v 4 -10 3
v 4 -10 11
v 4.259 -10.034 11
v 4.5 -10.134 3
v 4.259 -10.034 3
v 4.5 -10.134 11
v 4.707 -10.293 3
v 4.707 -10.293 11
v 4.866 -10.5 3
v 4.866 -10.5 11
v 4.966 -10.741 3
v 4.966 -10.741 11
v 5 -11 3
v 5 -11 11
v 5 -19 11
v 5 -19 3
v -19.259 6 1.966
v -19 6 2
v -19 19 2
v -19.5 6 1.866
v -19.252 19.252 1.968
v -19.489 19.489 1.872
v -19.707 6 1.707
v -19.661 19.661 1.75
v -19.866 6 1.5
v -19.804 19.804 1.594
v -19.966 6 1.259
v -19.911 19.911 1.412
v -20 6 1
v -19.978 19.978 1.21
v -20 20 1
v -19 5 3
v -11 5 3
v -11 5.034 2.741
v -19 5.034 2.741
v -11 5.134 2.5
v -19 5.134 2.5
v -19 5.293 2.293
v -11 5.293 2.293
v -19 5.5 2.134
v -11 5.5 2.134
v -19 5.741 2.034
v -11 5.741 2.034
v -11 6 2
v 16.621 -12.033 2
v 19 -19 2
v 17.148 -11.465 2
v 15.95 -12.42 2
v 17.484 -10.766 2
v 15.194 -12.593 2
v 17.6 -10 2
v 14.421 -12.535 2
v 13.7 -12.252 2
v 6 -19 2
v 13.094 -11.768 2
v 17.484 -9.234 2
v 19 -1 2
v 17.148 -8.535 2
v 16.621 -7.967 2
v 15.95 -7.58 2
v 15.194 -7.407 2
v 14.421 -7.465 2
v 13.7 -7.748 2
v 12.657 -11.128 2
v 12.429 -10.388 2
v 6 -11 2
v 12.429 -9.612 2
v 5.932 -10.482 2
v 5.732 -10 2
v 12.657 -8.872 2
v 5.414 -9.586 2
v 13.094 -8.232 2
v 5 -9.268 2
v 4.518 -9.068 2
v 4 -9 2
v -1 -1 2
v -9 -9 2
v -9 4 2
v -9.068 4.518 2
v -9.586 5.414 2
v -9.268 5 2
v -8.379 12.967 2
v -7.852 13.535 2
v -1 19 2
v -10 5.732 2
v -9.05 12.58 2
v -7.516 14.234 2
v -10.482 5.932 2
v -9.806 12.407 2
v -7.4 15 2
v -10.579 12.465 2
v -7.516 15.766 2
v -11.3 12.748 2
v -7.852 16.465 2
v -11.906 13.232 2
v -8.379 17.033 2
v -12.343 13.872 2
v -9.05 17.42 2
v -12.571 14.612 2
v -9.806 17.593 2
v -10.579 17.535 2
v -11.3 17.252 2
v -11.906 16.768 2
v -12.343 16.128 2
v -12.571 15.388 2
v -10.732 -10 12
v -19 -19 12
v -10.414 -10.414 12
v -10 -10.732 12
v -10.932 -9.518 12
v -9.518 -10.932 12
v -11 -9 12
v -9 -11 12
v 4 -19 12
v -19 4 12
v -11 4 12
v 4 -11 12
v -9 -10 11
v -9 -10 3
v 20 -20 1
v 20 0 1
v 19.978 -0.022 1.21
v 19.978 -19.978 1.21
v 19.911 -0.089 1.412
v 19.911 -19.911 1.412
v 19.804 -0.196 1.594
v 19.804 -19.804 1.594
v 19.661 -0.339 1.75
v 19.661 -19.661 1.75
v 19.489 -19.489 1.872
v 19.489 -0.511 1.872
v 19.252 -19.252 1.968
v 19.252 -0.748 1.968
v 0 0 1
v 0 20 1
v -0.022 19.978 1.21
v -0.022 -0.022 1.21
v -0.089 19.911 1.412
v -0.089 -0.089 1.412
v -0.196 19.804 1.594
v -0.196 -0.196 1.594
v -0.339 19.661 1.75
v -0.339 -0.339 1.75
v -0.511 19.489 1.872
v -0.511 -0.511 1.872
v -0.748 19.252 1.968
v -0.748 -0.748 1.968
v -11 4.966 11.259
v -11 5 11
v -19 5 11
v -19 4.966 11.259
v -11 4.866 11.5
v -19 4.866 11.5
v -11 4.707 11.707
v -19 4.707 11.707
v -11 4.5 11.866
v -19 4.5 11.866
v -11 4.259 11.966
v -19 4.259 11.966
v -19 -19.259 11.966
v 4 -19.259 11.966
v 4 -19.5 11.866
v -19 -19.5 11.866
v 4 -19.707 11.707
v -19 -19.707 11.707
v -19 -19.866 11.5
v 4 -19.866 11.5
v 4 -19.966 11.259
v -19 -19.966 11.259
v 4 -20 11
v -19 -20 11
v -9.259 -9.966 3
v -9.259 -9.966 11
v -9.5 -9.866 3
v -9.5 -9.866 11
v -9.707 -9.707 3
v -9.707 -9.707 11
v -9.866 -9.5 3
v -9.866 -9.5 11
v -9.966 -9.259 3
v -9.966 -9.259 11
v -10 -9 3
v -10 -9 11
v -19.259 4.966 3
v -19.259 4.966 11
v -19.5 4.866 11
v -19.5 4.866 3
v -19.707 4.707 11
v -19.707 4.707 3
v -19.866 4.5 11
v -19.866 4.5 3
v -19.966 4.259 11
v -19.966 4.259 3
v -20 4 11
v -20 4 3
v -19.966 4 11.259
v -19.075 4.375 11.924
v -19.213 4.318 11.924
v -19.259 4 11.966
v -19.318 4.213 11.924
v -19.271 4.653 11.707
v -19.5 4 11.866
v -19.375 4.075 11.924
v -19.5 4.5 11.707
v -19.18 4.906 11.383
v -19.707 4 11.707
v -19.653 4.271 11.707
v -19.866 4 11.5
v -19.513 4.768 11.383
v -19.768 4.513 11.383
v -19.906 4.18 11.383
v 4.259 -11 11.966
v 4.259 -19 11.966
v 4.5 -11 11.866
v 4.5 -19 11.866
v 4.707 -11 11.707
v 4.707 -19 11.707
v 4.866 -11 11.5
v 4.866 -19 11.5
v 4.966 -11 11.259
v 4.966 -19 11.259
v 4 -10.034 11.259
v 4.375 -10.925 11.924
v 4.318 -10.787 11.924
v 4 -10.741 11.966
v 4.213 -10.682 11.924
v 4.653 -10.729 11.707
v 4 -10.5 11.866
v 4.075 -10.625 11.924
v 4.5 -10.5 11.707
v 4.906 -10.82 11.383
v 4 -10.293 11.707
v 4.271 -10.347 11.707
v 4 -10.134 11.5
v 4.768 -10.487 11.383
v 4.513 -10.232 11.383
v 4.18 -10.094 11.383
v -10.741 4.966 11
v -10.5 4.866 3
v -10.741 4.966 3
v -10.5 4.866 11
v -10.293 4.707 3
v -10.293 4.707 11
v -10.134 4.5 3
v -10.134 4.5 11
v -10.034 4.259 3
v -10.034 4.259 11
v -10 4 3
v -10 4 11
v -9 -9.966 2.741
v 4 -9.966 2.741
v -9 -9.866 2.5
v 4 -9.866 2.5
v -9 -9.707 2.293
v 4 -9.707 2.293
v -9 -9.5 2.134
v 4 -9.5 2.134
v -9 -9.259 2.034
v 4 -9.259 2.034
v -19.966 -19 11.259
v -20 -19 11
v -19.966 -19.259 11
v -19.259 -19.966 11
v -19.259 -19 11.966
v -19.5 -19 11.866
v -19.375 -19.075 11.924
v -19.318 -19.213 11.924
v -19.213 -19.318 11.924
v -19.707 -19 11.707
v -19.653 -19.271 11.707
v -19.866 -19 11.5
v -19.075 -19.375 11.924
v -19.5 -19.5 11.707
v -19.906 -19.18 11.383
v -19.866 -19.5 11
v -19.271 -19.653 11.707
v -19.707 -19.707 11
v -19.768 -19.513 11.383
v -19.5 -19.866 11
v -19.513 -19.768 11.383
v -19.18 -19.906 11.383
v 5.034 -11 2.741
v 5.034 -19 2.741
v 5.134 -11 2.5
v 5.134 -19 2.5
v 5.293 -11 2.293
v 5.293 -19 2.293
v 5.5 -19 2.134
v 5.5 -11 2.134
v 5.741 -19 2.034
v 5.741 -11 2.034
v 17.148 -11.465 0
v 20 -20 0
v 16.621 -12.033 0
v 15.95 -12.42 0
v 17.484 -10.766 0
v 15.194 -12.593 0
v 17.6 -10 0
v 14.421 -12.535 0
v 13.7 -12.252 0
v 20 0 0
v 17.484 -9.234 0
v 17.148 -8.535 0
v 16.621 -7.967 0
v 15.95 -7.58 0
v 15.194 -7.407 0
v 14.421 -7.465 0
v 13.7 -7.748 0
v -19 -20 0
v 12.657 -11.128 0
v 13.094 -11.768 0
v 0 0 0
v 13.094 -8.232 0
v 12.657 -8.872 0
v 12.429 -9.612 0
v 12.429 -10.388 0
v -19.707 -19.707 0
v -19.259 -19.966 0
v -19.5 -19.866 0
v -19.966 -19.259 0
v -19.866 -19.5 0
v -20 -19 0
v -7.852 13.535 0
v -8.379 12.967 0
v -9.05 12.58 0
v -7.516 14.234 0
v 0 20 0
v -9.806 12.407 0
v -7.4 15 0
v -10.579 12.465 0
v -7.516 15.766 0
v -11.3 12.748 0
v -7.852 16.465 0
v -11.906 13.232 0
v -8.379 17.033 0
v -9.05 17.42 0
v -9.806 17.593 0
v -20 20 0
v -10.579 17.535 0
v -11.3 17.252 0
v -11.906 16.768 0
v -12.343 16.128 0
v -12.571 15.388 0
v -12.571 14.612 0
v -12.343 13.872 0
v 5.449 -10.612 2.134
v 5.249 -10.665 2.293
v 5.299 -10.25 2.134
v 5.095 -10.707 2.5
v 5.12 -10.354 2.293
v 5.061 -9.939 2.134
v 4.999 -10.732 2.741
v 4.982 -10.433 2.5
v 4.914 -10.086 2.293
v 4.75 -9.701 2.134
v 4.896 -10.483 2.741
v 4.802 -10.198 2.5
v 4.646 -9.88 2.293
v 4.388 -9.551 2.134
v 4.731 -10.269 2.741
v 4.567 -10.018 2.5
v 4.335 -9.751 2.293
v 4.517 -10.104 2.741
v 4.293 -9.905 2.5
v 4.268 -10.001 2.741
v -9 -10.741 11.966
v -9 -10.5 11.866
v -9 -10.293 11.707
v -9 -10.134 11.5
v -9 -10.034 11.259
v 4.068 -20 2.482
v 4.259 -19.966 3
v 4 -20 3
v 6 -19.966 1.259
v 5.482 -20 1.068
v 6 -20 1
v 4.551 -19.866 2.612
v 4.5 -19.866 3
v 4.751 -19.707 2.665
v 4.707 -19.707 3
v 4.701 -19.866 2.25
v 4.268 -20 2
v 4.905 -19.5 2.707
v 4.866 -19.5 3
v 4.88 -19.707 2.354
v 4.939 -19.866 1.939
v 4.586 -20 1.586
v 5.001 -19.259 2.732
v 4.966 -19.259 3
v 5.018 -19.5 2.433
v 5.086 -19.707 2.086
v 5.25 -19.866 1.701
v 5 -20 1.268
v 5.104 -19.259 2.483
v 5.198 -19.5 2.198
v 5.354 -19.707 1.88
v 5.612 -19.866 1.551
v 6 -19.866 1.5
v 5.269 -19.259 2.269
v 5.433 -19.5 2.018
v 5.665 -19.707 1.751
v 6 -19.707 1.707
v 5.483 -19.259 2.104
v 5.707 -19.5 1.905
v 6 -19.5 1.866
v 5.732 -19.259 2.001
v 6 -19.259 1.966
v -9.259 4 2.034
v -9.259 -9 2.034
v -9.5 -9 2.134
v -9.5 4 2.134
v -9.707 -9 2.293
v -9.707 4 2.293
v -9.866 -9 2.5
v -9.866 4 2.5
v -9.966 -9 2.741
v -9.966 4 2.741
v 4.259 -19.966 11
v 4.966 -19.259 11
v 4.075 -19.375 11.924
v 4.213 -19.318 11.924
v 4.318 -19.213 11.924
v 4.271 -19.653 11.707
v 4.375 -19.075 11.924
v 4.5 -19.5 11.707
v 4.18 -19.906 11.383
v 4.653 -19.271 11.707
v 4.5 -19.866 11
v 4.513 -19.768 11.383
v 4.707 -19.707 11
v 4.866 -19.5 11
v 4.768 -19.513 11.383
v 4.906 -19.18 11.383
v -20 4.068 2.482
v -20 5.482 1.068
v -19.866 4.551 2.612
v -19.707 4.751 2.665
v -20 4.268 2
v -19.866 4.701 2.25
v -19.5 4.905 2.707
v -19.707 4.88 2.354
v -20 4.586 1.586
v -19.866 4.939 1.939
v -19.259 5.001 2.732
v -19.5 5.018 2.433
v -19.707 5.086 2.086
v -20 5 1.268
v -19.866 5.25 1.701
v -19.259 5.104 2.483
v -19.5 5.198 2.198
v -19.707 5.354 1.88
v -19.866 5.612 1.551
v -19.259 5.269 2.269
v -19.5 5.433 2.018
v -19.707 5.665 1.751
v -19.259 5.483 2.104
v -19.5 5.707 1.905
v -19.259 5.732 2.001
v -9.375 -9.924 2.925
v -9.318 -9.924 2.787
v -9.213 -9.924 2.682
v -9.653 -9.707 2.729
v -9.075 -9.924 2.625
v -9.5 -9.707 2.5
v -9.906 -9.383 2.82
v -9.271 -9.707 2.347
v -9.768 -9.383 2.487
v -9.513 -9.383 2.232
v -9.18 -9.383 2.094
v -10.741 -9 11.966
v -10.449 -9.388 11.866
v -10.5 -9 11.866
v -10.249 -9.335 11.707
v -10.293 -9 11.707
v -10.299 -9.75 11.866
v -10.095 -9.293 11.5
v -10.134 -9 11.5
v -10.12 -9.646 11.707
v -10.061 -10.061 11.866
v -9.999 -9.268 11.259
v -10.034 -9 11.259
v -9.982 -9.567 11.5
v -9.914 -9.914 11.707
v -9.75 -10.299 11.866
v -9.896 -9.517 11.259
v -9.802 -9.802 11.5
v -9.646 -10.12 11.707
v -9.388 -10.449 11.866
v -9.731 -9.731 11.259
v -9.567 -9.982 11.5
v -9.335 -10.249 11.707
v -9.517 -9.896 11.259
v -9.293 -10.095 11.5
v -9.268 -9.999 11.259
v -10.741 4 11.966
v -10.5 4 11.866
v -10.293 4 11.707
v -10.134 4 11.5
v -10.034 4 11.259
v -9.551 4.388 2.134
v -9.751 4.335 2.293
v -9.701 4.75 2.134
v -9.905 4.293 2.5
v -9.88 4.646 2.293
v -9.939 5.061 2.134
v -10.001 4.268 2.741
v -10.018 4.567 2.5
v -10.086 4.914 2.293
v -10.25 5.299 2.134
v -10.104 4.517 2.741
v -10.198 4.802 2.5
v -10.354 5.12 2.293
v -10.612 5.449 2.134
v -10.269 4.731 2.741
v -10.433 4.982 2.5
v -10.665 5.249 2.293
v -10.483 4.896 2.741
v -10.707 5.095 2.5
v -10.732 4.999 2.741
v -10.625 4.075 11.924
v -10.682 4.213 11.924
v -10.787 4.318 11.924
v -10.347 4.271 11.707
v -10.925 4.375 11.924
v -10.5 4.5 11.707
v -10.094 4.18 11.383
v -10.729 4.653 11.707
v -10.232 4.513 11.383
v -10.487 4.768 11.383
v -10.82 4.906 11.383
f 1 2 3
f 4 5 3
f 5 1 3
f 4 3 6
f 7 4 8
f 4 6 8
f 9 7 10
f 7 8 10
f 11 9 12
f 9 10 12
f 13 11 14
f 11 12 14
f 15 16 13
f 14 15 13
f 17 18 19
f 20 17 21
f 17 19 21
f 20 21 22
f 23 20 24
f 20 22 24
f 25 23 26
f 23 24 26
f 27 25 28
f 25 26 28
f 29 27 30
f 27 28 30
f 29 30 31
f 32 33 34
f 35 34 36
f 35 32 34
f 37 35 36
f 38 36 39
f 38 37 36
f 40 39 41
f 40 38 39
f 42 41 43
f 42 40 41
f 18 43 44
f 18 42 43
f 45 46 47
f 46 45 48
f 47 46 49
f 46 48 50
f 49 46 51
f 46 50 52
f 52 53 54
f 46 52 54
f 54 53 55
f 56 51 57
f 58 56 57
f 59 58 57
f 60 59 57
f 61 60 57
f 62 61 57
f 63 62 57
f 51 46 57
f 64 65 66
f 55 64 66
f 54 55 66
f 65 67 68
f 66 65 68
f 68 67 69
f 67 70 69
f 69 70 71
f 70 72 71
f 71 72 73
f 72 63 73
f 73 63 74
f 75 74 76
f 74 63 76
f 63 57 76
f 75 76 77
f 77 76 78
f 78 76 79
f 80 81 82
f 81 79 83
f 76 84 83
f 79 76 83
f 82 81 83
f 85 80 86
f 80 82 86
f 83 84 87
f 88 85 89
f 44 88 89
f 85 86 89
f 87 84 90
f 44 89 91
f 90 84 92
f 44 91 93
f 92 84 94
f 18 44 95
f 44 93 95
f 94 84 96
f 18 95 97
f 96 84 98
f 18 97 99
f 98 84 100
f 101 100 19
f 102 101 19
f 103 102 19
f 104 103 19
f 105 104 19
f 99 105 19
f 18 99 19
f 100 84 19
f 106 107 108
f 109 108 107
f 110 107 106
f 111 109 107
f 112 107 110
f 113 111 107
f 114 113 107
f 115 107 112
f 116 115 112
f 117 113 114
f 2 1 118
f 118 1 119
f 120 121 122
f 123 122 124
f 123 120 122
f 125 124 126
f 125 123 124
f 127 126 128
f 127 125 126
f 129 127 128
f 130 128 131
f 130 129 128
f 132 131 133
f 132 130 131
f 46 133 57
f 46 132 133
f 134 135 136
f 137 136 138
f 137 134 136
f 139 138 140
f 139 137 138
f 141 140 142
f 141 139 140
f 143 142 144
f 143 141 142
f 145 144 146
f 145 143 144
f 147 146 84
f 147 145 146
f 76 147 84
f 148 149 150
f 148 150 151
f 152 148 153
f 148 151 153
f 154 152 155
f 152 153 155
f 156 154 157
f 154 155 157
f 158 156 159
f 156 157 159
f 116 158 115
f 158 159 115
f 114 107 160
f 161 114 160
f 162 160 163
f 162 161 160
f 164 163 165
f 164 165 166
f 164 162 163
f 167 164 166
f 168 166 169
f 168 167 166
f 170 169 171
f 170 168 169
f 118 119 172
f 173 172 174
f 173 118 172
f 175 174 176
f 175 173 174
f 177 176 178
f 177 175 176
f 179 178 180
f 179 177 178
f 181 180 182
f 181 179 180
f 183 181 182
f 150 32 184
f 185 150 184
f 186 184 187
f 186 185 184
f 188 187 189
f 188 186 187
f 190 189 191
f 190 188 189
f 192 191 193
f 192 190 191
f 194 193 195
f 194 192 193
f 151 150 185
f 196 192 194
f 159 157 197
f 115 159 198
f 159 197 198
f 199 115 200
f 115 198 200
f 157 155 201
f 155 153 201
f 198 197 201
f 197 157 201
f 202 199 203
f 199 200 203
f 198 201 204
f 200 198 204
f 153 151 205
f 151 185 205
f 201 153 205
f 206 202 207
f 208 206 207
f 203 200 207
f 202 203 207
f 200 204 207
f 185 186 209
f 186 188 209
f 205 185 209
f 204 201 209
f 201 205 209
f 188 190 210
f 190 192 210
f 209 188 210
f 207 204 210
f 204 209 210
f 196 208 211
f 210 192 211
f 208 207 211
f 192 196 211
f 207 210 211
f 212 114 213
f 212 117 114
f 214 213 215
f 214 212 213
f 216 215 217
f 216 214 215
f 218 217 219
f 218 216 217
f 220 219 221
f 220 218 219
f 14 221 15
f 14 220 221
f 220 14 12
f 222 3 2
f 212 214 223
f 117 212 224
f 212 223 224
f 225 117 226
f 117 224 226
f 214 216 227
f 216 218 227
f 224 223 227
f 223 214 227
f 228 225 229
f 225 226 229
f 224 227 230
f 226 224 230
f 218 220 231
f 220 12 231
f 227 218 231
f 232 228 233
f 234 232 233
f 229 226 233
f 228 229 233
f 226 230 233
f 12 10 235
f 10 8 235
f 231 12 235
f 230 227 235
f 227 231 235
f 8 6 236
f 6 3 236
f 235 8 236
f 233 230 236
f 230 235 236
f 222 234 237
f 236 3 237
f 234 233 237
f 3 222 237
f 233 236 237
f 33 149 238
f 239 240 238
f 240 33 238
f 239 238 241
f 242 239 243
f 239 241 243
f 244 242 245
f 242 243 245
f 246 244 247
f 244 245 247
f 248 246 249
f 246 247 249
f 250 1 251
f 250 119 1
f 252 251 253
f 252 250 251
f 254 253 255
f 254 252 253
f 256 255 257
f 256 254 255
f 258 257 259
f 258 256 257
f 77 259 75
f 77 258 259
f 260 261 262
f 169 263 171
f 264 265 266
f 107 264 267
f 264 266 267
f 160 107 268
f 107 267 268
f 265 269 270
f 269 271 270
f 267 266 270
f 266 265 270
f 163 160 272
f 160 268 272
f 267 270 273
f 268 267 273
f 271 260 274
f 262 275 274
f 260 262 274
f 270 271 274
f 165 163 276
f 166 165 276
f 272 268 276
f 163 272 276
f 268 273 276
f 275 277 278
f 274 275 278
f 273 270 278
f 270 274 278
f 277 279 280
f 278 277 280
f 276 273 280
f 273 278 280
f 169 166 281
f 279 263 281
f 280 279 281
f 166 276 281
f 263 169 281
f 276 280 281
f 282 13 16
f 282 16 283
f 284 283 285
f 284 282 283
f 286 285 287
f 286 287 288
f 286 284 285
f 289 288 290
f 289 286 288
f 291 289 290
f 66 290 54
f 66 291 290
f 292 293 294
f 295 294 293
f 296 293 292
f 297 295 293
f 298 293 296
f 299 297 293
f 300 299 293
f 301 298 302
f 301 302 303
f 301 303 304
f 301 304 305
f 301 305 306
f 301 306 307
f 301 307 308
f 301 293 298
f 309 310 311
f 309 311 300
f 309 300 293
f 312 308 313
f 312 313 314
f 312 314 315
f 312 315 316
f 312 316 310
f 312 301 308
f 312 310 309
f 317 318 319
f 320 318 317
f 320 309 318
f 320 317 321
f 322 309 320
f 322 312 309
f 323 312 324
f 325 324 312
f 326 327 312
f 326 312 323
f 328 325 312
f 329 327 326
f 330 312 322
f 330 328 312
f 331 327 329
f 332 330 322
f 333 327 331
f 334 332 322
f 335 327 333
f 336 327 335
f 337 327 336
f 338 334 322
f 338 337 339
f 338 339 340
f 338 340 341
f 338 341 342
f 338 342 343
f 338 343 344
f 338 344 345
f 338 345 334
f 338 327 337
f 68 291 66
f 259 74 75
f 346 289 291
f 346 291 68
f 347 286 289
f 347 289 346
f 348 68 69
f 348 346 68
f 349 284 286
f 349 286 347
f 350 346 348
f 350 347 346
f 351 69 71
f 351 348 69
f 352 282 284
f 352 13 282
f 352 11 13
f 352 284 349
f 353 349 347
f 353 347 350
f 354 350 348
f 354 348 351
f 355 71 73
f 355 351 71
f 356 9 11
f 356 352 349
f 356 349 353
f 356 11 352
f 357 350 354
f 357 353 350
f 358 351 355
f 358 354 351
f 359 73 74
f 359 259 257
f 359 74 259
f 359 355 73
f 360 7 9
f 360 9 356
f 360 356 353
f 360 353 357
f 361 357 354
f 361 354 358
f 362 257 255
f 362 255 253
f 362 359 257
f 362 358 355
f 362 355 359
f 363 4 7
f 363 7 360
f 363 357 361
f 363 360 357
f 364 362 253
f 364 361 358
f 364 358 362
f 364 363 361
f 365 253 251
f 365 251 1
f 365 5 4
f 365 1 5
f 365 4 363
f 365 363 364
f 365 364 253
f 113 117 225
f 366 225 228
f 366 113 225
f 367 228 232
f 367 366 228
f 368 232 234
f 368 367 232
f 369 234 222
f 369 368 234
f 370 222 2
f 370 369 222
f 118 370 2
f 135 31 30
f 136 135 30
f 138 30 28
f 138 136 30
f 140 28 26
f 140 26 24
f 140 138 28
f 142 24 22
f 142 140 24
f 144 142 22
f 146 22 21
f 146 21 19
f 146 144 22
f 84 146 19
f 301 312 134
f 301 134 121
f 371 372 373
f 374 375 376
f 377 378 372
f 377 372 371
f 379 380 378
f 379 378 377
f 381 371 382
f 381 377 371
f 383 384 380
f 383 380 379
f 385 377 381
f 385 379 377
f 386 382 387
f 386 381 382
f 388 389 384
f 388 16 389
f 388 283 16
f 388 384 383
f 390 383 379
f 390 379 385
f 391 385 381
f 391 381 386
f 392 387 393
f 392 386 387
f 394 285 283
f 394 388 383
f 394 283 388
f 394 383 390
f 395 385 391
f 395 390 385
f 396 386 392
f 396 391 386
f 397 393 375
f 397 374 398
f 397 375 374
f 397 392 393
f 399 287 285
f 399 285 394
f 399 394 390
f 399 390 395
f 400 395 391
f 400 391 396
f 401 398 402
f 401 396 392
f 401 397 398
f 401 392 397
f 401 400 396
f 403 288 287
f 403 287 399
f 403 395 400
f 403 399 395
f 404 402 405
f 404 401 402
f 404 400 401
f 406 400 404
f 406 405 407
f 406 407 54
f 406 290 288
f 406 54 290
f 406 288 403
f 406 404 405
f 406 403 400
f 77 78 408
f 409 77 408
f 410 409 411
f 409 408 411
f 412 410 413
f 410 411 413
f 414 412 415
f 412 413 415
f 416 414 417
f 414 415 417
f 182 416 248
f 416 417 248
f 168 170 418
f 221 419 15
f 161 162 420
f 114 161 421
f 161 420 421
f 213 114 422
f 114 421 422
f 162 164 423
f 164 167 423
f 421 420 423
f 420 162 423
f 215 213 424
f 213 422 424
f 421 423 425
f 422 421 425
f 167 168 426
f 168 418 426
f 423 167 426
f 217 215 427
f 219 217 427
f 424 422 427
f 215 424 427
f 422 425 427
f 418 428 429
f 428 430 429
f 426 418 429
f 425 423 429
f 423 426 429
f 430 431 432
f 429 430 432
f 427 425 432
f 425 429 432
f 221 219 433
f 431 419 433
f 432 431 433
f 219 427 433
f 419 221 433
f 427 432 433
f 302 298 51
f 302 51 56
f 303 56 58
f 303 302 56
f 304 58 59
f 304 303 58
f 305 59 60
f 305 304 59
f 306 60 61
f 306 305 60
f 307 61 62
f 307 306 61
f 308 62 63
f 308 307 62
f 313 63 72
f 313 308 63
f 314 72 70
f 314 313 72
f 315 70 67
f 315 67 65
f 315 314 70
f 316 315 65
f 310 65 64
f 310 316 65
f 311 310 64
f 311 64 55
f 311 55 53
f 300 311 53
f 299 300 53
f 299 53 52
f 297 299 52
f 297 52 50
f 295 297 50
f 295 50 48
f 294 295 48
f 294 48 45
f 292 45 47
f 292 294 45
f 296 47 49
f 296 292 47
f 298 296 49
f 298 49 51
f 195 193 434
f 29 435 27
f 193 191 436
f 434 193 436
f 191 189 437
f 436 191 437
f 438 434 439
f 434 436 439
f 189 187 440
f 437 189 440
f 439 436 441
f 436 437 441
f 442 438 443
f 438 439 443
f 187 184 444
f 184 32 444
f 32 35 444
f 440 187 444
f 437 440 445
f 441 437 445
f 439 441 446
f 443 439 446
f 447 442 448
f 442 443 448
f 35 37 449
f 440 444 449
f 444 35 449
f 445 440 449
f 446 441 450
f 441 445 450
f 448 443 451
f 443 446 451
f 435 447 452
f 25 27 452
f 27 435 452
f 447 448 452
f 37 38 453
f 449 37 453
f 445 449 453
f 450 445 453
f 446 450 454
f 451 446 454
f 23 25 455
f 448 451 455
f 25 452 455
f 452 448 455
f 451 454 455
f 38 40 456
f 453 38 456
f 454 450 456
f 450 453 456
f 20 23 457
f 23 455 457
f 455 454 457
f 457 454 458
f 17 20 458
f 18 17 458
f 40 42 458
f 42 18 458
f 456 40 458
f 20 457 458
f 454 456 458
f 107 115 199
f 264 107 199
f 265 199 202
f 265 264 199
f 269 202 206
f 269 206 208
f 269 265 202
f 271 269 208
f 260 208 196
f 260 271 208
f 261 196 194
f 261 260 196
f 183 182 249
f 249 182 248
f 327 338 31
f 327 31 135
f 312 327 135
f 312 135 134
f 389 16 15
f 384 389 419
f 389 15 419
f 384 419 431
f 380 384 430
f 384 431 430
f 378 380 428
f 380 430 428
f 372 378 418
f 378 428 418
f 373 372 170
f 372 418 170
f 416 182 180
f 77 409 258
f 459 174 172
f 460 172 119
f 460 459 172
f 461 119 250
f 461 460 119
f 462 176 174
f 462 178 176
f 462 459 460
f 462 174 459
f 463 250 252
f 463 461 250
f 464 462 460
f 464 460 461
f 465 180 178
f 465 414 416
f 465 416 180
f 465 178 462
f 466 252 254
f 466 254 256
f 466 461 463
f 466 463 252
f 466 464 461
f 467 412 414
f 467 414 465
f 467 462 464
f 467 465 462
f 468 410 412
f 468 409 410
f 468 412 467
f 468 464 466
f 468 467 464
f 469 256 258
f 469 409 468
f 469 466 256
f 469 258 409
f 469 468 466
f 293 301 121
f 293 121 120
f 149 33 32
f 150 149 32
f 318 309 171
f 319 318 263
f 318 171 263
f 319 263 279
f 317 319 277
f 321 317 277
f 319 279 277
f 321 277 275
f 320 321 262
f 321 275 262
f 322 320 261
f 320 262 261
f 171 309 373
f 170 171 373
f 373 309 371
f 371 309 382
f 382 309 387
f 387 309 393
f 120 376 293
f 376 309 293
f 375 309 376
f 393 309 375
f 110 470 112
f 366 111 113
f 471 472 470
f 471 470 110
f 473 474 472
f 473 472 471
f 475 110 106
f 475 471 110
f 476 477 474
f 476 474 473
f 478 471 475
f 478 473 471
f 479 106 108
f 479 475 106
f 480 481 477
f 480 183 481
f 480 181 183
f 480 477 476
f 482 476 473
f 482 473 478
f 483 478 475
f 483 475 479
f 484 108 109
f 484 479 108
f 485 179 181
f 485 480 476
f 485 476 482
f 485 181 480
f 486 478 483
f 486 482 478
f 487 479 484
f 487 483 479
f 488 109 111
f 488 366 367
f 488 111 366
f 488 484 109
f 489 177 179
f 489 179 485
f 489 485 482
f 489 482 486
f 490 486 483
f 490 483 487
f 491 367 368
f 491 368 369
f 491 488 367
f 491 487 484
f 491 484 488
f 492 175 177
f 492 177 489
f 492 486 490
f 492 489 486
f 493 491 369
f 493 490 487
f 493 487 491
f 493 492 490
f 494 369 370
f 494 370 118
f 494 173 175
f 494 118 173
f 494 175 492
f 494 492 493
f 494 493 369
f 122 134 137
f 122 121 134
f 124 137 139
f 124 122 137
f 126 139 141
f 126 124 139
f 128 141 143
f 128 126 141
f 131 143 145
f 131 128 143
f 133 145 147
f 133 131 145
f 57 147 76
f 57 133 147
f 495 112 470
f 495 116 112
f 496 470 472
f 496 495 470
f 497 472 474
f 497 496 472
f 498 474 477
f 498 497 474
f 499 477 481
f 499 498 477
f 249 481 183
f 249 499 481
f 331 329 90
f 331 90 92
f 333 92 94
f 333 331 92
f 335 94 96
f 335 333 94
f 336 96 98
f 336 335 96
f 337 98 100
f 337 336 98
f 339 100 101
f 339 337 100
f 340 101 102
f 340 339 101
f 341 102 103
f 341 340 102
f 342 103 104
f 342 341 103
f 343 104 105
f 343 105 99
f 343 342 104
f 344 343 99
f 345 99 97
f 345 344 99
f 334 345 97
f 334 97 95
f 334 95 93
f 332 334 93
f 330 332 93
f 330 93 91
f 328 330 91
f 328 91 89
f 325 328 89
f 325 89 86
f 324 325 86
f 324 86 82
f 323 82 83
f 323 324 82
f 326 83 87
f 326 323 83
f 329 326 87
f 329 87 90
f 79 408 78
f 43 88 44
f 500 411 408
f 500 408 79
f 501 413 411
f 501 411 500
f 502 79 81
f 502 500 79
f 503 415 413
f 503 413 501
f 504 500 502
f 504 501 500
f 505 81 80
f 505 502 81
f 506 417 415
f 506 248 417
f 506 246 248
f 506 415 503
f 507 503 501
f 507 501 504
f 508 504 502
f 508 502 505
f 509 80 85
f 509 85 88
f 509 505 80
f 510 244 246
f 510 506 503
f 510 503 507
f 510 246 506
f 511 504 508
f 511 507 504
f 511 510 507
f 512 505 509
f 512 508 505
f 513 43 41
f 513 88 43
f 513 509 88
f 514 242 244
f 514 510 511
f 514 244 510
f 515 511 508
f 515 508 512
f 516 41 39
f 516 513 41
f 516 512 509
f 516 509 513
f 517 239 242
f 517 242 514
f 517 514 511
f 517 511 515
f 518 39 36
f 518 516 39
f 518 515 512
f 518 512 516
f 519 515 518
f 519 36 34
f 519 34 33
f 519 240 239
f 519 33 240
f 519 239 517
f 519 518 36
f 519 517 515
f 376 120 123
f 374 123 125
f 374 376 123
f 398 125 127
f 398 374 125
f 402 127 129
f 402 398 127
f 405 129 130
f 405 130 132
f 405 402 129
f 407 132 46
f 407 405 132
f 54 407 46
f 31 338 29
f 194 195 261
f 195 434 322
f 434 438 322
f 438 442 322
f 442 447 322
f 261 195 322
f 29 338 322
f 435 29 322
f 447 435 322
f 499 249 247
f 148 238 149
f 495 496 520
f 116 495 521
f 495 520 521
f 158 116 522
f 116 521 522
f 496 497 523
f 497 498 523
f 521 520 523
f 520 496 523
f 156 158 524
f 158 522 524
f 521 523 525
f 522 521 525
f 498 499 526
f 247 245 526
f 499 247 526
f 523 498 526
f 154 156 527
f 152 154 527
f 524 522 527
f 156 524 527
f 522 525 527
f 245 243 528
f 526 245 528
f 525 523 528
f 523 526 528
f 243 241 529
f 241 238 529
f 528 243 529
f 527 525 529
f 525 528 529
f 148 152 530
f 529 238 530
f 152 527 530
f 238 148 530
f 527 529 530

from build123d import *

# Parameters (mm, degrees)
SKETCH1_R           = 2.6
BOSS_EXTRUDE1_DEPTH = 2
BOSS_EXTRUDE2_DEPTH = 10
FILLET1_R           = 1


with BuildPart() as part:
    # Sketch1 → Boss-Extrude1 (new body)
    with BuildSketch(Plane.XY):
        Polygon((0, 20), (0, 0), (20, 0), (20, -20), (-20, -20), (-20, 20), align=None)
        with Locations((-10, 15)):
            Circle(SKETCH1_R, mode=Mode.SUBTRACT)
        with Locations((15, -10)):
            Circle(SKETCH1_R, mode=Mode.SUBTRACT)
    extrude(amount=BOSS_EXTRUDE1_DEPTH)

    # Sketch2 → Boss-Extrude2 (add)
    with BuildSketch(Plane.XY.offset(2)):
        Polygon((-10, 5), (-20, 5), (-20, -20), (5, -20), (5, -10), (-10, -10), align=None)
    extrude(amount=BOSS_EXTRUDE2_DEPTH)

    # Fillet1
    fillet1_edges = [part.edges().sort_by_distance(p)[0] for p in [
        (-20, -20, 6),
        (20, -10, 2),
        (10, 0, 2),
        (0, 10, 2),
        (-10, 20, 2),
        (12.5, -20, 2),
        (-10, -2.5, 2),
        (-10, -10, 7),
        (-15, 5, 2),
        (-10, 5, 7),
        (-20, 5, 7),
        (5, -15, 2),
        (5, -20, 7),
        (-2.5, -10, 2),
        (5, -10, 7),
        (-10, -2.5, 12),
        (-15, 5, 12),
        (-20, -7.5, 12),
        (-7.5, -20, 12),
        (5, -15, 12),
        (-2.5, -10, 12),
        (-20, 12.5, 2),
    ]]
    fillet(fillet1_edges, radius=FILLET1_R)


solid = part.part
